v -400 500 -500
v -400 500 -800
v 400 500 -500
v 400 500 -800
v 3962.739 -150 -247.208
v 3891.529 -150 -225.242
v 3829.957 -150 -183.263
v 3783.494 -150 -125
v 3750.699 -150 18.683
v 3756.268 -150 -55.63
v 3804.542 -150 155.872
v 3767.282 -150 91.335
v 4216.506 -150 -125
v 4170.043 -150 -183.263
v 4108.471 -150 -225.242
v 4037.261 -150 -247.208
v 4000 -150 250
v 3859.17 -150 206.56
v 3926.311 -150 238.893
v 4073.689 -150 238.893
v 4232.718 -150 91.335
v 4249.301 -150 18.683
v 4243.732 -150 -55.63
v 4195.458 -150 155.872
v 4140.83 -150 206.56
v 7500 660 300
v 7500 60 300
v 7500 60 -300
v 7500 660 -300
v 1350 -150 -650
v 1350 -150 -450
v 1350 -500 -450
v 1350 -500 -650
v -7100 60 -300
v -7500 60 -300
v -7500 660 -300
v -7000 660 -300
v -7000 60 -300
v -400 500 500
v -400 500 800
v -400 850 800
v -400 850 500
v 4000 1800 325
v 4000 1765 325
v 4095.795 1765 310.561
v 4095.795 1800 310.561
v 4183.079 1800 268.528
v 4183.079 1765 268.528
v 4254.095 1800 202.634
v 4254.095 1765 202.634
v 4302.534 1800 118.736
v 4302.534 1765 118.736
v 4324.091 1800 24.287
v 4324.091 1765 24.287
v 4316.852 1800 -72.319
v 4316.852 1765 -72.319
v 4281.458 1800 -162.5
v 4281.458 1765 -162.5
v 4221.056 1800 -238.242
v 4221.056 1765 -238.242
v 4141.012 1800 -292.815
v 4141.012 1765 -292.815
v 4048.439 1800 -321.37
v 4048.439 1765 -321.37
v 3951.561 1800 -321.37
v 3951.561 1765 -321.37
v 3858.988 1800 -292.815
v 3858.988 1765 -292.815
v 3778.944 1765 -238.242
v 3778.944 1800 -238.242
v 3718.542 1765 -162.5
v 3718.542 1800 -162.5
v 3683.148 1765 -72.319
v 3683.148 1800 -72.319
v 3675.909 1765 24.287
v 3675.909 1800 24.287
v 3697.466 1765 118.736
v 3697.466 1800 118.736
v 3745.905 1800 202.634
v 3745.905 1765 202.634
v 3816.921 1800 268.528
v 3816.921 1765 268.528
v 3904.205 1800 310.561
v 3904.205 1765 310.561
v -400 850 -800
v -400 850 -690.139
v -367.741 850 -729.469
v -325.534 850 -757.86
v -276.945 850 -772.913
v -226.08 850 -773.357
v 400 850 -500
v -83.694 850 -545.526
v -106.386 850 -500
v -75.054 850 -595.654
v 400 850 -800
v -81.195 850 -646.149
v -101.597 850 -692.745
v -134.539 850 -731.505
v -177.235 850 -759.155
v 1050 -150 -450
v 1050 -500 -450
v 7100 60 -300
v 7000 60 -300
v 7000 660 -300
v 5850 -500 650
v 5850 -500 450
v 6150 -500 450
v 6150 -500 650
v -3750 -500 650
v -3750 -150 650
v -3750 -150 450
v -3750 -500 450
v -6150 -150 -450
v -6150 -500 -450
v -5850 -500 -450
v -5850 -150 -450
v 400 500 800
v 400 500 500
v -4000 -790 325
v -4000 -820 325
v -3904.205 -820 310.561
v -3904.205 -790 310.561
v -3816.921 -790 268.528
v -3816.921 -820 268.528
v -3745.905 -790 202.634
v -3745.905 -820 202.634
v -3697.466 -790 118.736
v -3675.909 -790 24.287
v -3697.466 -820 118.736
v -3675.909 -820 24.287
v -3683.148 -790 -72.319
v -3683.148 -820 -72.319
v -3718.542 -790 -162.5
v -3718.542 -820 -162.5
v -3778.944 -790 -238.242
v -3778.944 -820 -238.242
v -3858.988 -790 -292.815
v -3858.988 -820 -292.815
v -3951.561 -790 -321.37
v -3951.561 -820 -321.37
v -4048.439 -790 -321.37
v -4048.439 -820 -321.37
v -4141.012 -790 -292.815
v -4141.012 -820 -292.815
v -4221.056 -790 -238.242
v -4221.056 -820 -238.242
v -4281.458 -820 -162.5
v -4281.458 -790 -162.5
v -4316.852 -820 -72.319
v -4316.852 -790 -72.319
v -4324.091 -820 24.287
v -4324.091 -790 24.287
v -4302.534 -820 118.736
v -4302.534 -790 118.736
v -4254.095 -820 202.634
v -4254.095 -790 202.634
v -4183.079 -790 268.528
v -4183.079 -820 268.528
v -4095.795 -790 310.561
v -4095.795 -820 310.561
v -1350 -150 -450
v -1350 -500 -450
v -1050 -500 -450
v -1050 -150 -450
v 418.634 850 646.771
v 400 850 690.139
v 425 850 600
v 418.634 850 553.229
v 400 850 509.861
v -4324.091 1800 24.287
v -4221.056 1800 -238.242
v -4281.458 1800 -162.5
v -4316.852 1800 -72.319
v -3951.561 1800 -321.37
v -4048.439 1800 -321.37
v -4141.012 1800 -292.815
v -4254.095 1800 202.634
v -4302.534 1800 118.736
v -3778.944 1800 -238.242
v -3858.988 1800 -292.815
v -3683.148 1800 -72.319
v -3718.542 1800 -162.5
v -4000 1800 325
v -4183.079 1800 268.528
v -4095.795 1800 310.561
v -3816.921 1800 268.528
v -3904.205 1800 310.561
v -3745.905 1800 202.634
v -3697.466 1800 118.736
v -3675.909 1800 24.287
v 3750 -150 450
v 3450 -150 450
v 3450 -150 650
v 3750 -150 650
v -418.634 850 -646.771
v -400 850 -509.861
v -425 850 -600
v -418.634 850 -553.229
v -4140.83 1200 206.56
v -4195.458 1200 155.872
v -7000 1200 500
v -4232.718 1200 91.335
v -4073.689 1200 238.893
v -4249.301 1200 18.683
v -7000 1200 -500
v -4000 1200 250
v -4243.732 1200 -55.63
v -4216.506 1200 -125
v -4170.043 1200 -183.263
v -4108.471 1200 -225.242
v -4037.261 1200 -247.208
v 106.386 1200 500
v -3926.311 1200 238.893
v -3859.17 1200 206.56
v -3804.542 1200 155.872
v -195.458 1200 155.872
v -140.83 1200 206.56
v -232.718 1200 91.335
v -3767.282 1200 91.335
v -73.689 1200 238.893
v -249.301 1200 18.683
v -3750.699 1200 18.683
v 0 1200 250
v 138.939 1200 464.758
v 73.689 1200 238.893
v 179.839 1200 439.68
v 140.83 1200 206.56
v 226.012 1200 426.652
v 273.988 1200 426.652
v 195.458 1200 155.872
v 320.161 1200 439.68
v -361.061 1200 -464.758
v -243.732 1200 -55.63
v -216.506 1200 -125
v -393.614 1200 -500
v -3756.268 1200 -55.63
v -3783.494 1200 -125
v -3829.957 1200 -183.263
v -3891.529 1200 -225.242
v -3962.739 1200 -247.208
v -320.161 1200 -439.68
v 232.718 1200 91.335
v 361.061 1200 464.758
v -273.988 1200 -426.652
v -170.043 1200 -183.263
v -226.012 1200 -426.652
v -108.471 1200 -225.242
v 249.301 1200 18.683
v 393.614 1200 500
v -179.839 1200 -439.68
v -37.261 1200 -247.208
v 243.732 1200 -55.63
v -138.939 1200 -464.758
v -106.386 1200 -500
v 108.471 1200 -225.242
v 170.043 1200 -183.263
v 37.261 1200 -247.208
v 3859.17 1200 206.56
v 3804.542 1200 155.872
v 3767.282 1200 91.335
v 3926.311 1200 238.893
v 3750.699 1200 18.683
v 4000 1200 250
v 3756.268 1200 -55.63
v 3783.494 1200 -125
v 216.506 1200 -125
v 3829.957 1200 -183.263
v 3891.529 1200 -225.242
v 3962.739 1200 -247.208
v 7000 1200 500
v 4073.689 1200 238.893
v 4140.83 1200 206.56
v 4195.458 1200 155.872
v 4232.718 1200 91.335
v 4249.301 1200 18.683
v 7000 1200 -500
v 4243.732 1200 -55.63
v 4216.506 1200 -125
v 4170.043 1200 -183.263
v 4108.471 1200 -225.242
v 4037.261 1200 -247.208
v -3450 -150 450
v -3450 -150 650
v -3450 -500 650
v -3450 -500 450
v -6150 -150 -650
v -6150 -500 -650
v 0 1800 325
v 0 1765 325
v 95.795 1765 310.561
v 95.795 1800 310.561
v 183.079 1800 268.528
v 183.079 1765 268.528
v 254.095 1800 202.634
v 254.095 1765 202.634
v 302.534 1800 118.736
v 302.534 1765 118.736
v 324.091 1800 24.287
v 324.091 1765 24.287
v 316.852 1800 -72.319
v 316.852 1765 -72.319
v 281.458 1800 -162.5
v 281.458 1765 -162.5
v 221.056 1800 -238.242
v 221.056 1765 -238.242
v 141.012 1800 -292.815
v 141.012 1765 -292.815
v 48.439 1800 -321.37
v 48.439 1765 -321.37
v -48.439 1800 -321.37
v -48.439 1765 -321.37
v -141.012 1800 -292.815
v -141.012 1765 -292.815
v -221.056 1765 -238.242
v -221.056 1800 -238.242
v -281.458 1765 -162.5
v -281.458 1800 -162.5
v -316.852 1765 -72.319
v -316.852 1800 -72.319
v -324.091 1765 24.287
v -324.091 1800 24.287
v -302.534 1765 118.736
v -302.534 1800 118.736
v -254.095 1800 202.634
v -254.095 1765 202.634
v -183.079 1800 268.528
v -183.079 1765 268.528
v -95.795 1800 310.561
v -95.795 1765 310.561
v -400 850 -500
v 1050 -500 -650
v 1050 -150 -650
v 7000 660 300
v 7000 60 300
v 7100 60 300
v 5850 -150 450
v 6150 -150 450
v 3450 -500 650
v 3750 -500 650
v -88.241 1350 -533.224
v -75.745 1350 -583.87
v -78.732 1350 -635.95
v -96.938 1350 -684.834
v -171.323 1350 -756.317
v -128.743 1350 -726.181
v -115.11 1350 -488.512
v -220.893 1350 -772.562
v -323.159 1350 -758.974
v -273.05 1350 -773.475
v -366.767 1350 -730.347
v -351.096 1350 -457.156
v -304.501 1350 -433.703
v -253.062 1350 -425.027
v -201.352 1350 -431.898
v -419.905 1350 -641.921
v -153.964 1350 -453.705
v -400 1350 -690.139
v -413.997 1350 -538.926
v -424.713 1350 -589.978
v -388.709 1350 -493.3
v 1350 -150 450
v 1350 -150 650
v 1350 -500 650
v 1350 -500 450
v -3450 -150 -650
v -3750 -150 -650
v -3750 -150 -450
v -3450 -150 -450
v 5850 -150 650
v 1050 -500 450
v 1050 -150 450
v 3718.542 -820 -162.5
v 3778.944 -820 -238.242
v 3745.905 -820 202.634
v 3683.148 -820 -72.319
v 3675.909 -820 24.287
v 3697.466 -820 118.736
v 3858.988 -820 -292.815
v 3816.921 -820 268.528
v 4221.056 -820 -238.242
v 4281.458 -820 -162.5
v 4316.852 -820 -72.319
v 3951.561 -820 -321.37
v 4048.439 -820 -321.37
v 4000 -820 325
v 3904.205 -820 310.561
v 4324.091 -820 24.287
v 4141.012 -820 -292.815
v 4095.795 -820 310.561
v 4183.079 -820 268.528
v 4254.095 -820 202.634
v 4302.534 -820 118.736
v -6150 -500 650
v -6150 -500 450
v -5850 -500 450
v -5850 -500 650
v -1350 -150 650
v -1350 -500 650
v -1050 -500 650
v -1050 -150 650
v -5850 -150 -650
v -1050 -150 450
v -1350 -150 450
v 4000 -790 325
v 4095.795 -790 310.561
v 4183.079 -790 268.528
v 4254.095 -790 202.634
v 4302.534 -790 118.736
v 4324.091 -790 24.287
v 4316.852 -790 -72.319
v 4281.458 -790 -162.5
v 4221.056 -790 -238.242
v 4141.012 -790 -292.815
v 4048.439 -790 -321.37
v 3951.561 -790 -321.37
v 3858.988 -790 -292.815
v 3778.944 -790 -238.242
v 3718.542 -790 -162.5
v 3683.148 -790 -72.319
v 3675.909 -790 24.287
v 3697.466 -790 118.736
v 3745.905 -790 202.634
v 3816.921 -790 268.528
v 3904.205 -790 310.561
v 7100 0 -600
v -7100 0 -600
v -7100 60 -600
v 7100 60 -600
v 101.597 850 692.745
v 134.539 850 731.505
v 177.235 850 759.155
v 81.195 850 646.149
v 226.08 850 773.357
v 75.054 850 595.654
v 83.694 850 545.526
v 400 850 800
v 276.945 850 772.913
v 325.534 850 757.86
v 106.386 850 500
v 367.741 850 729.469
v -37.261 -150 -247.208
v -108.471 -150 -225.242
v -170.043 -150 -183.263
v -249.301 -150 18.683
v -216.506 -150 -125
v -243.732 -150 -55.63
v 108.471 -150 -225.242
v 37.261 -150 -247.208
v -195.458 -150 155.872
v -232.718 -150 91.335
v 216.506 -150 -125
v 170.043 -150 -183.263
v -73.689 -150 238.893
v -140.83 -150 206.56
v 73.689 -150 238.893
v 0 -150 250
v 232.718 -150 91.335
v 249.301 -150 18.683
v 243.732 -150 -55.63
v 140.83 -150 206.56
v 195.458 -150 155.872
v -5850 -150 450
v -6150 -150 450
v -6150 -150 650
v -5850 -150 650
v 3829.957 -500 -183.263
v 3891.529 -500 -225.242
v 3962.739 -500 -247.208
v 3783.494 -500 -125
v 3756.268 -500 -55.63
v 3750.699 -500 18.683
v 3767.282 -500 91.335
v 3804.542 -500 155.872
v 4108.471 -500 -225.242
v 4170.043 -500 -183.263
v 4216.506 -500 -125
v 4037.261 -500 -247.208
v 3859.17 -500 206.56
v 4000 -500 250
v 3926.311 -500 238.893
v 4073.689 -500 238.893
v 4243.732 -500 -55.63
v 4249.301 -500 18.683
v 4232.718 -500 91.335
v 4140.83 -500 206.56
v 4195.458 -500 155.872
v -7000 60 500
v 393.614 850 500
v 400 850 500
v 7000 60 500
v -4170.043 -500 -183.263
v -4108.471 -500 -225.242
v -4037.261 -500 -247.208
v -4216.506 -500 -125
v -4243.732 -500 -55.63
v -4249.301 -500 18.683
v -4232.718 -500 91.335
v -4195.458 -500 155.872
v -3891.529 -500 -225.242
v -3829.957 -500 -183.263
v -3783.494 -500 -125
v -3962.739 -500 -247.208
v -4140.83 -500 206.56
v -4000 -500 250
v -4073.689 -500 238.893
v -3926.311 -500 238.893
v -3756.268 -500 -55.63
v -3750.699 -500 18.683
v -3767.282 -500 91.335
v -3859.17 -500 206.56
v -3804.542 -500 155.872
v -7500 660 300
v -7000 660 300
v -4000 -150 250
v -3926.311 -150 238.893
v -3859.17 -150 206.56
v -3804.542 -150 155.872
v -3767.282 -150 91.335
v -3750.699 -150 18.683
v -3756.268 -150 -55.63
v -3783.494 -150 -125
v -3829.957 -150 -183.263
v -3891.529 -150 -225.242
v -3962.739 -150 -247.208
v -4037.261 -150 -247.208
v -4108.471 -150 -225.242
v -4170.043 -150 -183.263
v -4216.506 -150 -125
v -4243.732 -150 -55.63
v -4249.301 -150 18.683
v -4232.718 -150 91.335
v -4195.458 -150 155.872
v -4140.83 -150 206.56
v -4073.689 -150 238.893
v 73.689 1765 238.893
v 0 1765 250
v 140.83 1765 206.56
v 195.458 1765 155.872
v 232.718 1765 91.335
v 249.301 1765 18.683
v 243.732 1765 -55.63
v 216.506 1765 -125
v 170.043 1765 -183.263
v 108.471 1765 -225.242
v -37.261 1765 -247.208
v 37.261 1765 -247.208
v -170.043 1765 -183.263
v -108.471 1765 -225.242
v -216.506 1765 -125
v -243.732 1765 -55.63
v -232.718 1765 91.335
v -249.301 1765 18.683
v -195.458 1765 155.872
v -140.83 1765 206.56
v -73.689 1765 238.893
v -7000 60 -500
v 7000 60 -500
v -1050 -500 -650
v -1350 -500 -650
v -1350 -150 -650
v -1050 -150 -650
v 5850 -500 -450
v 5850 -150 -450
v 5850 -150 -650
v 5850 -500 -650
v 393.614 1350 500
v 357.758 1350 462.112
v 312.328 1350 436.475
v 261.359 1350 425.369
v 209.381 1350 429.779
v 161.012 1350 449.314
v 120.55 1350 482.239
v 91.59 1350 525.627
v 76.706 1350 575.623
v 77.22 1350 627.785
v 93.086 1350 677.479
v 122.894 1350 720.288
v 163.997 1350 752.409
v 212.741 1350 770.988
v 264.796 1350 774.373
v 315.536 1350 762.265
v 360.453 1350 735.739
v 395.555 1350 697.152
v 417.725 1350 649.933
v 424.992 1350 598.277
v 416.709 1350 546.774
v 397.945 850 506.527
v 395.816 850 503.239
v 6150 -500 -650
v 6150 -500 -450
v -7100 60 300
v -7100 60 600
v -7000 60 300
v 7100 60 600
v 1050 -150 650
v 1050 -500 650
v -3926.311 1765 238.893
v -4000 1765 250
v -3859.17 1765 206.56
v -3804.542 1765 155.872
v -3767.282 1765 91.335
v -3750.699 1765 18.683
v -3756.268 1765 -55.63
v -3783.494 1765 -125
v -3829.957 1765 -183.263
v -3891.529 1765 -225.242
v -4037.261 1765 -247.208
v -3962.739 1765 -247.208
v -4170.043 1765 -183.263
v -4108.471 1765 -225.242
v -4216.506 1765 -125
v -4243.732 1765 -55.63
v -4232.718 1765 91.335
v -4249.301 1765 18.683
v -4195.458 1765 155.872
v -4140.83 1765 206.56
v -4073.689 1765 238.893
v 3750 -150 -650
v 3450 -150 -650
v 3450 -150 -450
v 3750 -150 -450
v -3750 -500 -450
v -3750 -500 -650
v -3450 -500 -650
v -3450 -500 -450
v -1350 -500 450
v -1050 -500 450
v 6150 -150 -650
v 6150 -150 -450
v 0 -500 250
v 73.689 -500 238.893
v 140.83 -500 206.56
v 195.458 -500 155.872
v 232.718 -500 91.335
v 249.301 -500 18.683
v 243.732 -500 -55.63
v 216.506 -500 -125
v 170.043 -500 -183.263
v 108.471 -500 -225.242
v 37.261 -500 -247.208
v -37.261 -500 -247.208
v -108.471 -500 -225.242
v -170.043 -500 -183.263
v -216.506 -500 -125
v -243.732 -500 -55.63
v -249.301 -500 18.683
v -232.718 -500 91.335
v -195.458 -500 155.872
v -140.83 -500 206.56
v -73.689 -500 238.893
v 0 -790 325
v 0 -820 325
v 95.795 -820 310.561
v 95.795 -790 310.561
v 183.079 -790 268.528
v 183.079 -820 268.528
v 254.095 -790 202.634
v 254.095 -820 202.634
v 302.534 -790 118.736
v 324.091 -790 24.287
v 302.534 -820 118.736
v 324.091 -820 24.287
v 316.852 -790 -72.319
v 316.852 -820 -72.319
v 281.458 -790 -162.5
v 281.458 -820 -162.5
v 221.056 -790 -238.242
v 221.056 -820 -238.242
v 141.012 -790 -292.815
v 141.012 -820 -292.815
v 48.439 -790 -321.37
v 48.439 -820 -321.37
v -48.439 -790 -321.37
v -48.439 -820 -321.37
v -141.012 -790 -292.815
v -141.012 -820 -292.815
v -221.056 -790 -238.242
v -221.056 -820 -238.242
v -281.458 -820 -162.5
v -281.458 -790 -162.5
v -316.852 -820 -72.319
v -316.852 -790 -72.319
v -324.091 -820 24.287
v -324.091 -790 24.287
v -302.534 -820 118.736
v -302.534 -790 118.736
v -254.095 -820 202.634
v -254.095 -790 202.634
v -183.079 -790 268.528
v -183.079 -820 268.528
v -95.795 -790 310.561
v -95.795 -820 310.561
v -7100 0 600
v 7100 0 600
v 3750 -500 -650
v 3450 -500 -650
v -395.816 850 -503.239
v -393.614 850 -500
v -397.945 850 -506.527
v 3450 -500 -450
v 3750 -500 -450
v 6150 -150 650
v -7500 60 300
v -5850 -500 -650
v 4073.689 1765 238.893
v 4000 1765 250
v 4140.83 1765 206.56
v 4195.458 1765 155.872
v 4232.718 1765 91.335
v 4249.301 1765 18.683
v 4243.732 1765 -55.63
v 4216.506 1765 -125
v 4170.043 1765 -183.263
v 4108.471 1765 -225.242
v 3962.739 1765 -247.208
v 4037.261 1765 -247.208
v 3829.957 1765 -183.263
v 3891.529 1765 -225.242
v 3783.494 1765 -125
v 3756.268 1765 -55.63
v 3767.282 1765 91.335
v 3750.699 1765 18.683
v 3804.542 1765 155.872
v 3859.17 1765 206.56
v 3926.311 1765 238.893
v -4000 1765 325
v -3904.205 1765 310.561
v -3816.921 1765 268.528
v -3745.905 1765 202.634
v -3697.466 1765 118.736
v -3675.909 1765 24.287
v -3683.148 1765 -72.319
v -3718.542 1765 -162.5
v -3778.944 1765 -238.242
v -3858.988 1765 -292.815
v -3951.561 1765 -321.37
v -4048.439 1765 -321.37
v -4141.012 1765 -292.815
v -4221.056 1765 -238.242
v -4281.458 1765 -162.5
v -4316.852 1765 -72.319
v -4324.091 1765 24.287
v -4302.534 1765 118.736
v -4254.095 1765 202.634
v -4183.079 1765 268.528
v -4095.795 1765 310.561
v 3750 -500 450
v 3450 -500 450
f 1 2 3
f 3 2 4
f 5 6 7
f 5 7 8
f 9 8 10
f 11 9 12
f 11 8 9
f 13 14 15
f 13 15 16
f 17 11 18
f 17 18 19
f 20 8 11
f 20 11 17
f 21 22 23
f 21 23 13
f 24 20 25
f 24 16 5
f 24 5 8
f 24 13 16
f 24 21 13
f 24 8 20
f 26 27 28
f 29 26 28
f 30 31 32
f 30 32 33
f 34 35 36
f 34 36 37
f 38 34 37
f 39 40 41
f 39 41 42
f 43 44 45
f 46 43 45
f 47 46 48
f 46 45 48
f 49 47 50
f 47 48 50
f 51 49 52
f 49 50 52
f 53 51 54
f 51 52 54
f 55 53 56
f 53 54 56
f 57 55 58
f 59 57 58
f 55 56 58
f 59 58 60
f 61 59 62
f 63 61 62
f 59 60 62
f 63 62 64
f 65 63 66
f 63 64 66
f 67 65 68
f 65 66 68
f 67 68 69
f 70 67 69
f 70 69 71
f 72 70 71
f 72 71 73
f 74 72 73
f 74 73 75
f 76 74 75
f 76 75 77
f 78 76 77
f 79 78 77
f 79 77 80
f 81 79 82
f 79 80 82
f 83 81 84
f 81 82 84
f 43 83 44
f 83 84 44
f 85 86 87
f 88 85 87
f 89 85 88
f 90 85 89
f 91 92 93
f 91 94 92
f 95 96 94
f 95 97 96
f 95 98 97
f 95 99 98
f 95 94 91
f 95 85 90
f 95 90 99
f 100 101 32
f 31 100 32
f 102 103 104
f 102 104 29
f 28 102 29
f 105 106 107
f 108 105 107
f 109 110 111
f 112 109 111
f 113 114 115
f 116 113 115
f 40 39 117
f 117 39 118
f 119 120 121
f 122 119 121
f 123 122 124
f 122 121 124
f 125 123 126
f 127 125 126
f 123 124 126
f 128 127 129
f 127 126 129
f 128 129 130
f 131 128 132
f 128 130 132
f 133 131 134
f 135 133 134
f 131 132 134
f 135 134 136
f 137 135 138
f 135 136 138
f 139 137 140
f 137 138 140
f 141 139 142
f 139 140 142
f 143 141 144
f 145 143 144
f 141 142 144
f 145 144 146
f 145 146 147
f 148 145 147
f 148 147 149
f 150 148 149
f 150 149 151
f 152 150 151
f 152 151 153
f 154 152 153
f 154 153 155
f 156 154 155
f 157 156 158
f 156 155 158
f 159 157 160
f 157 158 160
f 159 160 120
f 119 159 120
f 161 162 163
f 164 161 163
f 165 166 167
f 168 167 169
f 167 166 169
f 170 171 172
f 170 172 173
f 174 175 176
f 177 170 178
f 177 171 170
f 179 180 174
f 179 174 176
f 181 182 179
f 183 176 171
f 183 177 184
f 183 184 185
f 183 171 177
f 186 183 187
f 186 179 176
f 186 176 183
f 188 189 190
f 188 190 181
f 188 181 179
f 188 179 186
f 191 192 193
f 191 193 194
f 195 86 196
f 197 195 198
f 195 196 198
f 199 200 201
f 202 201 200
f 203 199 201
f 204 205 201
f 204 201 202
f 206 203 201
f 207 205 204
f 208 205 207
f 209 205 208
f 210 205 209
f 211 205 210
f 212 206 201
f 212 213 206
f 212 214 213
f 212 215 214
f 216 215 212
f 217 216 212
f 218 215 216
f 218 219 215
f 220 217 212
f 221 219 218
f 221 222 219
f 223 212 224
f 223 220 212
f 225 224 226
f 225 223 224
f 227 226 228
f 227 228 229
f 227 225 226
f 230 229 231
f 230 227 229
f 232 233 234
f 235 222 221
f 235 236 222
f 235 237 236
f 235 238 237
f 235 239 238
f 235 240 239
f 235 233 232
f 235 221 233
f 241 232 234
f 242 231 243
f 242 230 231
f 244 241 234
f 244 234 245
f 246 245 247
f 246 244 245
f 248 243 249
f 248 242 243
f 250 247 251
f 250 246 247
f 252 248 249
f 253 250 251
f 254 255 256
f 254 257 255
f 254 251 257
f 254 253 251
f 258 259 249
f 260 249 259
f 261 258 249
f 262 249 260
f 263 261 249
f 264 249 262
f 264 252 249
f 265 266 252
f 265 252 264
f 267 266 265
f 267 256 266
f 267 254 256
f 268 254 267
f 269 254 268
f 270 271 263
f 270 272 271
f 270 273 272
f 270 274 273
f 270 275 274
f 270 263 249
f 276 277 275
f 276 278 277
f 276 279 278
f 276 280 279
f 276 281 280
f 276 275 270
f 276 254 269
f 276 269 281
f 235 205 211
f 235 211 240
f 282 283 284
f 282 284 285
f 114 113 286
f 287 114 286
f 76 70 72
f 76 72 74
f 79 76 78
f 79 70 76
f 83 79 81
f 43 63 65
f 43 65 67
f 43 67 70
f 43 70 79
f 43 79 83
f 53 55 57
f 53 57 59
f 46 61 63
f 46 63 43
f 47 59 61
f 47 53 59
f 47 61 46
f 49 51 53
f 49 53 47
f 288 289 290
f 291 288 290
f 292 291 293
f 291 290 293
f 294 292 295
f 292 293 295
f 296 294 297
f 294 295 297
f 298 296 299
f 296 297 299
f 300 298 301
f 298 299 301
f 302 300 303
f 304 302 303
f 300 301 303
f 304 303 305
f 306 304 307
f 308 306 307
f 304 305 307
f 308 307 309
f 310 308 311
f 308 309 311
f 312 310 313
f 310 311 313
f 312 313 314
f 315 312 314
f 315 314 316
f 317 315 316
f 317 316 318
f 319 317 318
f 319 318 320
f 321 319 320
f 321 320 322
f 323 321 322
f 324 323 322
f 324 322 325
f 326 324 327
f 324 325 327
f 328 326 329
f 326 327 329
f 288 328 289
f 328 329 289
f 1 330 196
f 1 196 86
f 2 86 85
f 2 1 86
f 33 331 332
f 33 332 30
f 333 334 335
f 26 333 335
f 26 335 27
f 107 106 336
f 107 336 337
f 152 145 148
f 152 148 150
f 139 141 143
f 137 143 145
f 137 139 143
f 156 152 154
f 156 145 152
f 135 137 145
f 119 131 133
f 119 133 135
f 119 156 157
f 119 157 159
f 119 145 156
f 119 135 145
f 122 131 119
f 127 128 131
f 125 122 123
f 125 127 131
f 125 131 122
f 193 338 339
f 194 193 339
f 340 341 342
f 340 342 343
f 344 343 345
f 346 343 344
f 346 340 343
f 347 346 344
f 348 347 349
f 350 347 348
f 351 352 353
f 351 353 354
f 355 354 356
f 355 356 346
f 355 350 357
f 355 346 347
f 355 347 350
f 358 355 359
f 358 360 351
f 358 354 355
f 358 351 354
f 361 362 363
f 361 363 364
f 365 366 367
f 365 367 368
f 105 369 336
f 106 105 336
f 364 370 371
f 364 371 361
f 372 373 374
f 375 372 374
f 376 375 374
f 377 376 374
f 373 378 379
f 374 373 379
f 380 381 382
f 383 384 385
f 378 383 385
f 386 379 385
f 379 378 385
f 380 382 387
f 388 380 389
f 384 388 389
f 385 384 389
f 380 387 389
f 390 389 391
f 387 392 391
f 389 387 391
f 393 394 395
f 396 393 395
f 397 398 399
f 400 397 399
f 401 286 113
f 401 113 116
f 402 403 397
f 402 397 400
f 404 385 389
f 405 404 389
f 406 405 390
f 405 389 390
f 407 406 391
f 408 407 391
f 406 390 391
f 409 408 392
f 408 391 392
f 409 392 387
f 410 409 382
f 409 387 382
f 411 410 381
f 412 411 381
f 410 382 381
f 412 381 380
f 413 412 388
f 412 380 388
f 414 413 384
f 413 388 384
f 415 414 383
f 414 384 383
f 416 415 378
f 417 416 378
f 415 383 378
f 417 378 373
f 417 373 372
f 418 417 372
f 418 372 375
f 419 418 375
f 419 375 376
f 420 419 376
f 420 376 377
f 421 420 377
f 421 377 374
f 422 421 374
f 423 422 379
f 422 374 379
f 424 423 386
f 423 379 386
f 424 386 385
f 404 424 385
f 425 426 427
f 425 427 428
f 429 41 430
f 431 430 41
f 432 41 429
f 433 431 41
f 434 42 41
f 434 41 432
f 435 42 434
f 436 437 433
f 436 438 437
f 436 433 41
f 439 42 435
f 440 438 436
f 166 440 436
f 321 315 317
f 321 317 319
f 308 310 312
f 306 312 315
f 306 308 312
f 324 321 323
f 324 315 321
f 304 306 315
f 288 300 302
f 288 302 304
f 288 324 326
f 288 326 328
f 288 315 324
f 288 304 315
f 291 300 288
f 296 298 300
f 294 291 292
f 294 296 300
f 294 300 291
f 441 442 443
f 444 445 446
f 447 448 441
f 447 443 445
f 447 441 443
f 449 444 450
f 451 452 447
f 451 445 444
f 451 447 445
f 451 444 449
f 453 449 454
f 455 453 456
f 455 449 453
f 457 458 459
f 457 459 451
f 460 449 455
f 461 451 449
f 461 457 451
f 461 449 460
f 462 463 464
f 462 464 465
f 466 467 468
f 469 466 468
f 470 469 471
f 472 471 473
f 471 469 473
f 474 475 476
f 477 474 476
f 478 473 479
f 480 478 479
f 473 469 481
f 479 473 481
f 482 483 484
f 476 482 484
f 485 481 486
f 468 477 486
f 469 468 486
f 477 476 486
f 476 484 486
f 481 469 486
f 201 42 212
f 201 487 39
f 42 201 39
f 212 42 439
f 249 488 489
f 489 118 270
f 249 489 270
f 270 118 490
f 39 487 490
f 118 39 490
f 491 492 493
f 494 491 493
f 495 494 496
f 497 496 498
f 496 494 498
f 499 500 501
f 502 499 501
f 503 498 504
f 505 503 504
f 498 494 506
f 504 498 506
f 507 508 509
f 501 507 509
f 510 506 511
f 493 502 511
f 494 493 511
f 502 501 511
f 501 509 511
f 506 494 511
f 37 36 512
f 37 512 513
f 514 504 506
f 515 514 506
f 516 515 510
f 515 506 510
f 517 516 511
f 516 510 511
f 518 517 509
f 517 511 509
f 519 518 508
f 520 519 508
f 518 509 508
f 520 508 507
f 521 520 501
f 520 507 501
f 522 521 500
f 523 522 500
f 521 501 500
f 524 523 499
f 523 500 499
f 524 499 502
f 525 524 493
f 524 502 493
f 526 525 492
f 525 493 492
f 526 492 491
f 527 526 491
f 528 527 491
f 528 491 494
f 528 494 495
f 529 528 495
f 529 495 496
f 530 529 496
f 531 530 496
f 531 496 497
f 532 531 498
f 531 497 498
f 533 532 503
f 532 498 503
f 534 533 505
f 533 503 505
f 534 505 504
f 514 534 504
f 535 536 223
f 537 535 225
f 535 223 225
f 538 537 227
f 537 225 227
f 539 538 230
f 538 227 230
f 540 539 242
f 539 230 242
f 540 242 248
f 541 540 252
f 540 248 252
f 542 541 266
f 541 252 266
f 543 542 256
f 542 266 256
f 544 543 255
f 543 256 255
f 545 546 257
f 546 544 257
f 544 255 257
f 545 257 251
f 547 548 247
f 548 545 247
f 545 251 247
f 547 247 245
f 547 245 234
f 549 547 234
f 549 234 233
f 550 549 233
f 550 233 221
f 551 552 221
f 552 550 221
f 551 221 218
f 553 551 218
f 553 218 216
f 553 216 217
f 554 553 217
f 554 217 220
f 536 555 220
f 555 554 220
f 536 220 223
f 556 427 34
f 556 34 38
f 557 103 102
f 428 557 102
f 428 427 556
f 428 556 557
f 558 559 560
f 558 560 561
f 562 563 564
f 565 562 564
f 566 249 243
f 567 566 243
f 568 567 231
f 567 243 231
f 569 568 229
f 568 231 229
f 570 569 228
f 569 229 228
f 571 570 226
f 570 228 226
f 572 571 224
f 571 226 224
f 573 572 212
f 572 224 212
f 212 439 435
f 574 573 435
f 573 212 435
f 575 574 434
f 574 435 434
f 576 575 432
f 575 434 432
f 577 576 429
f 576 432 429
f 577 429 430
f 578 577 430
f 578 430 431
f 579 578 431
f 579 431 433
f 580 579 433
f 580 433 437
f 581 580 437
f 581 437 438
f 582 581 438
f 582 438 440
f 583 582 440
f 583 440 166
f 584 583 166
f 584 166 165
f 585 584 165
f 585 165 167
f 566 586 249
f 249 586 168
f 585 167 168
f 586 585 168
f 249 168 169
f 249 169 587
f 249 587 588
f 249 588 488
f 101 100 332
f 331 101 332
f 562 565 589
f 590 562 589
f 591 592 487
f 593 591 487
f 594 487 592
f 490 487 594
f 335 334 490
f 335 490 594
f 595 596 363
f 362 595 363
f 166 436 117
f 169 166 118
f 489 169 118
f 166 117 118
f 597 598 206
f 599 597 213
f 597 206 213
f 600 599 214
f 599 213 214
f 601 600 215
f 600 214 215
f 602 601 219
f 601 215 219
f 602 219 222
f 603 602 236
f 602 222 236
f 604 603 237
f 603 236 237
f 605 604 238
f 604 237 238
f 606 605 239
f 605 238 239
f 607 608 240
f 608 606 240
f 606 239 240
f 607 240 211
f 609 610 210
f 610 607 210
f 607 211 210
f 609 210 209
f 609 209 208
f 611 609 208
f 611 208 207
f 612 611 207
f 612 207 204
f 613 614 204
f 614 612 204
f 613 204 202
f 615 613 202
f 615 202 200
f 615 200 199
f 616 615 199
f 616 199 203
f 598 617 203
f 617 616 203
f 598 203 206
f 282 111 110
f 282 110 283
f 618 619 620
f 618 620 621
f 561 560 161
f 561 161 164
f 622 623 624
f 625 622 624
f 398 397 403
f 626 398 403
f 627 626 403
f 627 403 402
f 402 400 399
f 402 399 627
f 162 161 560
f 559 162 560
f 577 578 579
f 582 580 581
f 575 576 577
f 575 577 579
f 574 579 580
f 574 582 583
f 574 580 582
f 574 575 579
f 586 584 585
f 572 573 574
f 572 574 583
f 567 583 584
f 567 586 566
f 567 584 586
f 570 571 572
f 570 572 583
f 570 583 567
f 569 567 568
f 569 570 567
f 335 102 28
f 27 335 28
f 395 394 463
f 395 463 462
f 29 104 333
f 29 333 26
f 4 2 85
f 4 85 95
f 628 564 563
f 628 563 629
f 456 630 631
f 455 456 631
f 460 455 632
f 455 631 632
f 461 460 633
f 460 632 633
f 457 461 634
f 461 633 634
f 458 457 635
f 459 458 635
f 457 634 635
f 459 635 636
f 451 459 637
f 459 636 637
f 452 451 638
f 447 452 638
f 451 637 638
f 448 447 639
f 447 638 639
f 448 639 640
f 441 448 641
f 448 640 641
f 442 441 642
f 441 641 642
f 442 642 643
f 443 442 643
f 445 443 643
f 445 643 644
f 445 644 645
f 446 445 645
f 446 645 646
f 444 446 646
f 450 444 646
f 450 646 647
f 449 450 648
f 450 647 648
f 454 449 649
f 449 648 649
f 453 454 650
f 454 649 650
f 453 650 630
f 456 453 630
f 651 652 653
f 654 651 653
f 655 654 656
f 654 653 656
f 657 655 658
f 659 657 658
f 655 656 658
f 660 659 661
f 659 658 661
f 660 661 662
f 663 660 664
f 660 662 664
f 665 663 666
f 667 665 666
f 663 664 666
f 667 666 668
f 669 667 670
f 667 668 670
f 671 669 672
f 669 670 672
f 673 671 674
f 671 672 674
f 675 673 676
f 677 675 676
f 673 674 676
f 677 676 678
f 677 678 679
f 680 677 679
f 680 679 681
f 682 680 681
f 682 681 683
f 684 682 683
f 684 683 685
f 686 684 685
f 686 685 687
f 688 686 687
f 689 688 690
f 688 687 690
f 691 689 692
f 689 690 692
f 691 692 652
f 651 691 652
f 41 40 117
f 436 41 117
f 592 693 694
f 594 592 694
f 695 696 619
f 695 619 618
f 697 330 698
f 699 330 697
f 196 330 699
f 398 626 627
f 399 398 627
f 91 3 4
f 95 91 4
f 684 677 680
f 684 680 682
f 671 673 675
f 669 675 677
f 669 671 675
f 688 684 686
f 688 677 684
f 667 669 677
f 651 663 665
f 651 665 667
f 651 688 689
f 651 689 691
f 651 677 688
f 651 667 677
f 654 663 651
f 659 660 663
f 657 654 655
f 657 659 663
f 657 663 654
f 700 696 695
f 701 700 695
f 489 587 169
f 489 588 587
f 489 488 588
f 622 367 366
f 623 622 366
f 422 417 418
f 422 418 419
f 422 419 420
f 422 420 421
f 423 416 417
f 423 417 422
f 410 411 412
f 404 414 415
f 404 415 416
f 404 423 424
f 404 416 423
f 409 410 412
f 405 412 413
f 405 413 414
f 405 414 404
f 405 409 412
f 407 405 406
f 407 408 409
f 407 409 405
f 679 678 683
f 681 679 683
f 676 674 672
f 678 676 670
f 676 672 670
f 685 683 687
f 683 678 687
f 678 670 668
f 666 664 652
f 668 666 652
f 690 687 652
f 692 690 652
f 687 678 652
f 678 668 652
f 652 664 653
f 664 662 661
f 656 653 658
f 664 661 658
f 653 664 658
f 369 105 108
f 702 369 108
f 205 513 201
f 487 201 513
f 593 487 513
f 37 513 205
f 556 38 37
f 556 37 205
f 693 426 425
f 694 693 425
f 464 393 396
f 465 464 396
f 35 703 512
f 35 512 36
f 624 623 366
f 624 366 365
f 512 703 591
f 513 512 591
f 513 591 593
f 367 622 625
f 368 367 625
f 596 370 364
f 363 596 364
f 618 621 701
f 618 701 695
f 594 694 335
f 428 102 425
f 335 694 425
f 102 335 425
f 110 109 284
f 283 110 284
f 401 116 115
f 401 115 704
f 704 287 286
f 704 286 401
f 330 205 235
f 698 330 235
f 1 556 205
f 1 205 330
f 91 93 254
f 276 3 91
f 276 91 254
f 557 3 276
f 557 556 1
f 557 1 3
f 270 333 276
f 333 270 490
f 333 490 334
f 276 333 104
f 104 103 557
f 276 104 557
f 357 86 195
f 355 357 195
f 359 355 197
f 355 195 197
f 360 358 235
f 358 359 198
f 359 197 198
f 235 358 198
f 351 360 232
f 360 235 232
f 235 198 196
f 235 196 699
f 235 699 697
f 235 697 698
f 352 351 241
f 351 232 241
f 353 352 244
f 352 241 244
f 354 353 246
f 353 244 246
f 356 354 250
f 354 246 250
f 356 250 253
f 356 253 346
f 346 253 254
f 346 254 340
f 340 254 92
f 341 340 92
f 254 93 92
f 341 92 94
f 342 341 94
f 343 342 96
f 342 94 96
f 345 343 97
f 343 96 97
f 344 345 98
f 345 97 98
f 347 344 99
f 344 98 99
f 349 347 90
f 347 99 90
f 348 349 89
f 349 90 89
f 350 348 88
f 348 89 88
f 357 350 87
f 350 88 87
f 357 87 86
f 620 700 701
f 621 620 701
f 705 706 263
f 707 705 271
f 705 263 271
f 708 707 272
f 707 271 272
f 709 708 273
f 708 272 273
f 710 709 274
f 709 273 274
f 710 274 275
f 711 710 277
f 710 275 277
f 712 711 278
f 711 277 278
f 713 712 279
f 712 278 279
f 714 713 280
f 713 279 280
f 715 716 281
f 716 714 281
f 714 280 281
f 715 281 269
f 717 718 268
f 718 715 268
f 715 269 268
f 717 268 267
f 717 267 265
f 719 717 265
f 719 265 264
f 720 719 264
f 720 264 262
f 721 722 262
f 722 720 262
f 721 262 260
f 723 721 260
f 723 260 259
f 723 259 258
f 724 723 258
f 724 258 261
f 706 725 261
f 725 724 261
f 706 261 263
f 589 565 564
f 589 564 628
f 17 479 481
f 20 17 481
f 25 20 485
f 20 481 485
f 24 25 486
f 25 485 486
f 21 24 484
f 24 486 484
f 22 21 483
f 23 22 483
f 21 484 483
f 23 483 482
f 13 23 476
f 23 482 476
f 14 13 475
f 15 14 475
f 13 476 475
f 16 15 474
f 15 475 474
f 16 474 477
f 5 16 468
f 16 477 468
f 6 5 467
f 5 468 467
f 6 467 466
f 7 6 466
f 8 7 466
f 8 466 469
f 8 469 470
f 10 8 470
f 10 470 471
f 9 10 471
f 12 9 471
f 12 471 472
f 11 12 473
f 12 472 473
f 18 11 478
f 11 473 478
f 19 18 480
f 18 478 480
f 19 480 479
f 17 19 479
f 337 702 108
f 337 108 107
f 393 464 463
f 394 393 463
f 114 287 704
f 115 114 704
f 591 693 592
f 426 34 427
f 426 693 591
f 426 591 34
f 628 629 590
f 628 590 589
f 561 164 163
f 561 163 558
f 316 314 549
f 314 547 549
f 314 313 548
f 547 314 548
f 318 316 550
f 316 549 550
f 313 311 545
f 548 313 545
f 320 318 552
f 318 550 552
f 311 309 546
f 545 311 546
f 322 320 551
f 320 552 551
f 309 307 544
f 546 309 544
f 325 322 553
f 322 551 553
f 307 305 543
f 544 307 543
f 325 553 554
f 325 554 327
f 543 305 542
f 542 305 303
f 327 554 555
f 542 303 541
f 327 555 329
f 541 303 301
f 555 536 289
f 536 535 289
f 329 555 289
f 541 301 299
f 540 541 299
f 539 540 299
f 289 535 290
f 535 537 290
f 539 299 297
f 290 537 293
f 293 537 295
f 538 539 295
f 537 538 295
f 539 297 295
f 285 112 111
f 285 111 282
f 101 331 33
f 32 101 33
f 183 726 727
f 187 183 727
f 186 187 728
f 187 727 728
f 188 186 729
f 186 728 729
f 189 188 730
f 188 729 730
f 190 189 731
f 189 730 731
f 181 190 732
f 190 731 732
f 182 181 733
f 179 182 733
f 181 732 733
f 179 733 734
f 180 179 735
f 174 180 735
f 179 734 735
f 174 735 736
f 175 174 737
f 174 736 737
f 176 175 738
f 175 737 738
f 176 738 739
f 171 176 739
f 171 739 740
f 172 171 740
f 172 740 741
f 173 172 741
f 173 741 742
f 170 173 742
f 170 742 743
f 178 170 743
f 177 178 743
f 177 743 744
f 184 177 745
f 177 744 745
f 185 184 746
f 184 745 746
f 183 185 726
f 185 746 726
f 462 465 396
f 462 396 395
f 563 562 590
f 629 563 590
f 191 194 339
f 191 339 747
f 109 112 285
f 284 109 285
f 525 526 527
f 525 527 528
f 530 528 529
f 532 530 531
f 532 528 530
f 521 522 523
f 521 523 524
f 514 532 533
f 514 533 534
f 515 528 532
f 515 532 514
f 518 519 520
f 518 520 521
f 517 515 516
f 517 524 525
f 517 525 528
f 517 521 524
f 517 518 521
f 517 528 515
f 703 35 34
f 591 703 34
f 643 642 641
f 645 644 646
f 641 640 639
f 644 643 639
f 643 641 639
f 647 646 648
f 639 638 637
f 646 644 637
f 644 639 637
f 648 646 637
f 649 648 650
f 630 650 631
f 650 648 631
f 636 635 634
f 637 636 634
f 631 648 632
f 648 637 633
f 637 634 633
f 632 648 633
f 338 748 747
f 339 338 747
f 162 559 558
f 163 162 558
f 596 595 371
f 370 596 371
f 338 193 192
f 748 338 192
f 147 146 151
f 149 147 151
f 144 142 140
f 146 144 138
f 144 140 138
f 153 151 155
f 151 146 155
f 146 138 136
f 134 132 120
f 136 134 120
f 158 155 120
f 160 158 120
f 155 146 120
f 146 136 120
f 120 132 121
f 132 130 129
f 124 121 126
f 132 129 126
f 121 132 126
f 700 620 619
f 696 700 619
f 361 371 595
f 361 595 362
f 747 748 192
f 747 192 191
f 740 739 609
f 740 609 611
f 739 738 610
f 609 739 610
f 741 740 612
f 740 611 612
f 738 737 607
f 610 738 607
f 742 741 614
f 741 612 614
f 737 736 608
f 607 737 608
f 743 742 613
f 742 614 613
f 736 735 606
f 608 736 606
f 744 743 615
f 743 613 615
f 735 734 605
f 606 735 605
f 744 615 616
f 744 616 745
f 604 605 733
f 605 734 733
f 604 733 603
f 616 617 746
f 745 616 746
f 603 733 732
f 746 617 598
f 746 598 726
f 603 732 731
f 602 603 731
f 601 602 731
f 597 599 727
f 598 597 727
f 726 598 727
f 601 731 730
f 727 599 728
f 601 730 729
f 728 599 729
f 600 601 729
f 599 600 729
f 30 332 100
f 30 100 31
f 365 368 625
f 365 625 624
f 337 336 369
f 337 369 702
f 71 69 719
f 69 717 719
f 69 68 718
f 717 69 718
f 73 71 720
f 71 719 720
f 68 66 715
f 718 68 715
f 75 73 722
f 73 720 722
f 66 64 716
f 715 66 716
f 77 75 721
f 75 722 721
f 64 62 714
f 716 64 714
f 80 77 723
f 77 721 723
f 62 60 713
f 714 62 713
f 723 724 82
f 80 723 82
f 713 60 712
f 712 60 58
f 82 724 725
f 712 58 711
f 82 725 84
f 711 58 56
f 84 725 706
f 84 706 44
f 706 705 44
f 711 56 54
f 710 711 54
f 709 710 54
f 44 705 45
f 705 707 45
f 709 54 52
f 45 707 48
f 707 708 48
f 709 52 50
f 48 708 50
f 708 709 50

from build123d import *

# Parameters (mm, degrees)
SKETCH1_W               = 14000
SKETCH1_H               = 1000
BOSS_EXTRUDE1_DEPTH     = 500
BOSS_EXTRUDE2_START     = -500
SKETCH2_R               = 250
BOSS_EXTRUDE2_DEPTH     = 350
BOSS_EXTRUDE2_2_DEPTH   = 350
BOSS_EXTRUDE2_3_DEPTH   = 350
BOSS_EXTRUDE3_START     = -820
SKETCH3_R               = 325
BOSS_EXTRUDE3_DEPTH     = 30
BOSS_EXTRUDE3_2_DEPTH   = 30
BOSS_EXTRUDE3_3_DEPTH   = 30
SKETCH4_W               = 14200
SKETCH4_H               = 1200
BOSS_EXTRUDE4_DEPTH     = 60
BOSS_EXTRUDE5_START     = 60
SKETCH5_W               = 14000
SKETCH5_H               = 1000
BOSS_EXTRUDE5_DEPTH     = 1140
BOSS_EXTRUDE6_START     = 1200
SKETCH6_R               = 250
BOSS_EXTRUDE6_DEPTH     = 600
BOSS_EXTRUDE7_START     = 1765
SKETCH7_R               = 325
BOSS_EXTRUDE7_DEPTH     = 35
BOSS_EXTRUDE8_START     = 60
SKETCH8_W               = 500
SKETCH8_H               = 600
BOSS_EXTRUDE8_DEPTH     = 600
BOSS_EXTRUDE9_START     = 500
SKETCH9_W               = 800
SKETCH9_H               = 1600
BOSS_EXTRUDE9_DEPTH     = 350
BOSS_EXTRUDE10_START    = 850
SKETCH10_R              = 175
BOSS_EXTRUDE10_DEPTH    = 500
BOSS_EXTRUDE11_START    = -500
SKETCH11_W              = 300
SKETCH11_H              = 200
BOSS_EXTRUDE11_DEPTH    = 350
BOSS_EXTRUDE11_2_DEPTH  = 350
BOSS_EXTRUDE11_3_DEPTH  = 350
BOSS_EXTRUDE11_4_DEPTH  = 350
BOSS_EXTRUDE11_5_DEPTH  = 350
BOSS_EXTRUDE11_6_DEPTH  = 350
BOSS_EXTRUDE11_7_DEPTH  = 350
BOSS_EXTRUDE11_8_DEPTH  = 350
BOSS_EXTRUDE11_9_DEPTH  = 350
BOSS_EXTRUDE11_10_DEPTH = 350
BOSS_EXTRUDE11_11_DEPTH = 350
BOSS_EXTRUDE11_12_DEPTH = 350


with BuildPart() as part:
    # Sketch1 → Boss-Extrude1 (new body)
    with BuildSketch(Plane(origin=(0, 0, 0), x_dir=(1, 0, 0), z_dir=(0, 1, 0))):
        Rectangle(SKETCH1_W, SKETCH1_H)
    extrude(amount=BOSS_EXTRUDE1_DEPTH)

    # Sketch4 → Boss-Extrude4 (add)
    with BuildSketch(Plane(origin=(0, 0, 0), x_dir=(1, 0, 0), z_dir=(0, 1, 0))):
        Rectangle(SKETCH4_W, SKETCH4_H)
    extrude(amount=BOSS_EXTRUDE4_DEPTH)

    # Sketch5 → Boss-Extrude5 (add)
    with BuildSketch(Plane(origin=(0, 0, 0), x_dir=(1, 0, 0), z_dir=(0, 1, 0)).offset(BOSS_EXTRUDE5_START)):
        Rectangle(SKETCH5_W, SKETCH5_H)
    extrude(amount=BOSS_EXTRUDE5_DEPTH)

    # Sketch6 → Boss-Extrude6 (add)
    with BuildSketch(Plane(origin=(0, 0, 0), x_dir=(1, 0, 0), z_dir=(0, 1, 0)).offset(BOSS_EXTRUDE6_START)):
        with Locations(Location((-4000, 0, 0), (0, 0, 270))):
            Circle(SKETCH6_R)
        with Locations(Location((0, 0, 0), (0, 0, 270))):
            Circle(SKETCH6_R)
        with Locations(Location((4000, 0, 0), (0, 0, 270))):
            Circle(SKETCH6_R)
    extrude(amount=BOSS_EXTRUDE6_DEPTH)

    # Sketch7 → Boss-Extrude7 (add)
    with BuildSketch(Plane(origin=(0, 0, 0), x_dir=(1, 0, 0), z_dir=(0, 1, 0)).offset(BOSS_EXTRUDE7_START)):
        with Locations(Location((-4000, 0, 0), (0, 0, 270))):
            Circle(SKETCH7_R)
        with Locations(Location((0, 0, 0), (0, 0, 270))):
            Circle(SKETCH7_R)
        with Locations(Location((4000, 0, 0), (0, 0, 270))):
            Circle(SKETCH7_R)
    extrude(amount=BOSS_EXTRUDE7_DEPTH)

    # Sketch8 → Boss-Extrude8 (add)
    with BuildSketch(Plane(origin=(0, 0, 0), x_dir=(1, 0, 0), z_dir=(0, 1, 0)).offset(BOSS_EXTRUDE8_START)):
        with Locations((-7250, 0)):
            Rectangle(SKETCH8_W, SKETCH8_H)
        with Locations((7250, 0)):
            Rectangle(SKETCH8_W, SKETCH8_H)
    extrude(amount=BOSS_EXTRUDE8_DEPTH)

    # Sketch9 → Boss-Extrude9 (add)
    with BuildSketch(Plane(origin=(0, 0, 0), x_dir=(1, 0, 0), z_dir=(0, 1, 0)).offset(BOSS_EXTRUDE9_START)):
        Rectangle(SKETCH9_W, SKETCH9_H)
    extrude(amount=BOSS_EXTRUDE9_DEPTH)

    # Sketch10 → Boss-Extrude10 (add)
    with BuildSketch(Plane(origin=(0, 0, 0), x_dir=(1, 0, 0), z_dir=(0, 1, 0)).offset(BOSS_EXTRUDE10_START)):
        with Locations(Location((-250, 600, 0), (0, 0, 148.997280866))):
            Circle(SKETCH10_R)
        with Locations(Location((250, -600, 0), (0, 0, 34.849904579))):
            Circle(SKETCH10_R)
    extrude(amount=BOSS_EXTRUDE10_DEPTH)


with BuildPart() as body_2:
    # Sketch2 → Boss-Extrude2 (new body)
    with BuildSketch(Plane(origin=(0, 0, 0), x_dir=(1, 0, 0), z_dir=(0, 1, 0)).offset(BOSS_EXTRUDE2_START)):
        with Locations(Location((-4000, 0, 0), (0, 0, 270))):
            Circle(SKETCH2_R)
    extrude(amount=BOSS_EXTRUDE2_DEPTH)


with BuildPart() as body_3:
    # Sketch2 → Boss-Extrude2 2 (new body)
    with BuildSketch(Plane(origin=(0, 0, 0), x_dir=(1, 0, 0), z_dir=(0, 1, 0)).offset(BOSS_EXTRUDE2_START)):
        with Locations(Location((0, 0, 0), (0, 0, 270))):
            Circle(SKETCH2_R)
    extrude(amount=BOSS_EXTRUDE2_2_DEPTH)


with BuildPart() as body_4:
    # Sketch2 → Boss-Extrude2 3 (new body)
    with BuildSketch(Plane(origin=(0, 0, 0), x_dir=(1, 0, 0), z_dir=(0, 1, 0)).offset(BOSS_EXTRUDE2_START)):
        with Locations(Location((4000, 0, 0), (0, 0, 270))):
            Circle(SKETCH2_R)
    extrude(amount=BOSS_EXTRUDE2_3_DEPTH)


with BuildPart() as body_5:
    # Sketch3 → Boss-Extrude3 (new body)
    with BuildSketch(Plane(origin=(0, 0, 0), x_dir=(1, 0, 0), z_dir=(0, 1, 0)).offset(BOSS_EXTRUDE3_START)):
        with Locations(Location((-4000, 0, 0), (0, 0, 270))):
            Circle(SKETCH3_R)
    extrude(amount=BOSS_EXTRUDE3_DEPTH)


with BuildPart() as body_6:
    # Sketch3 → Boss-Extrude3 2 (new body)
    with BuildSketch(Plane(origin=(0, 0, 0), x_dir=(1, 0, 0), z_dir=(0, 1, 0)).offset(BOSS_EXTRUDE3_START)):
        with Locations(Location((0, 0, 0), (0, 0, 270))):
            Circle(SKETCH3_R)
    extrude(amount=BOSS_EXTRUDE3_2_DEPTH)


with BuildPart() as body_7:
    # Sketch3 → Boss-Extrude3 3 (new body)
    with BuildSketch(Plane(origin=(0, 0, 0), x_dir=(1, 0, 0), z_dir=(0, 1, 0)).offset(BOSS_EXTRUDE3_START)):
        with Locations(Location((4000, 0, 0), (0, 0, 270))):
            Circle(SKETCH3_R)
    extrude(amount=BOSS_EXTRUDE3_3_DEPTH)


with BuildPart() as body_8:
    # Sketch11 → Boss-Extrude11 (new body)
    with BuildSketch(Plane(origin=(0, 0, 0), x_dir=(1, 0, 0), z_dir=(0, 1, 0)).offset(BOSS_EXTRUDE11_START)):
        with Locations((-6000, -550)):
            Rectangle(SKETCH11_W, SKETCH11_H)
    extrude(amount=BOSS_EXTRUDE11_DEPTH)


with BuildPart() as body_9:
    # Sketch11 → Boss-Extrude11 2 (new body)
    with BuildSketch(Plane(origin=(0, 0, 0), x_dir=(1, 0, 0), z_dir=(0, 1, 0)).offset(BOSS_EXTRUDE11_START)):
        with Locations((-6000, 550)):
            Rectangle(SKETCH11_W, SKETCH11_H)
    extrude(amount=BOSS_EXTRUDE11_2_DEPTH)


with BuildPart() as body_10:
    # Sketch11 → Boss-Extrude11 3 (new body)
    with BuildSketch(Plane(origin=(0, 0, 0), x_dir=(1, 0, 0), z_dir=(0, 1, 0)).offset(BOSS_EXTRUDE11_START)):
        with Locations((-3600, -550)):
            Rectangle(SKETCH11_W, SKETCH11_H)
    extrude(amount=BOSS_EXTRUDE11_3_DEPTH)


with BuildPart() as body_11:
    # Sketch11 → Boss-Extrude11 4 (new body)
    with BuildSketch(Plane(origin=(0, 0, 0), x_dir=(1, 0, 0), z_dir=(0, 1, 0)).offset(BOSS_EXTRUDE11_START)):
        with Locations((-3600, 550)):
            Rectangle(SKETCH11_W, SKETCH11_H)
    extrude(amount=BOSS_EXTRUDE11_4_DEPTH)


with BuildPart() as body_12:
    # Sketch11 → Boss-Extrude11 5 (new body)
    with BuildSketch(Plane(origin=(0, 0, 0), x_dir=(1, 0, 0), z_dir=(0, 1, 0)).offset(BOSS_EXTRUDE11_START)):
        with Locations((-1200, -550)):
            Rectangle(SKETCH11_W, SKETCH11_H)
    extrude(amount=BOSS_EXTRUDE11_5_DEPTH)


with BuildPart() as body_13:
    # Sketch11 → Boss-Extrude11 6 (new body)
    with BuildSketch(Plane(origin=(0, 0, 0), x_dir=(1, 0, 0), z_dir=(0, 1, 0)).offset(BOSS_EXTRUDE11_START)):
        with Locations((-1200, 550)):
            Rectangle(SKETCH11_W, SKETCH11_H)
    extrude(amount=BOSS_EXTRUDE11_6_DEPTH)


with BuildPart() as body_14:
    # Sketch11 → Boss-Extrude11 7 (new body)
    with BuildSketch(Plane(origin=(0, 0, 0), x_dir=(1, 0, 0), z_dir=(0, 1, 0)).offset(BOSS_EXTRUDE11_START)):
        with Locations((1200, -550)):
            Rectangle(SKETCH11_W, SKETCH11_H)
    extrude(amount=BOSS_EXTRUDE11_7_DEPTH)


with BuildPart() as body_15:
    # Sketch11 → Boss-Extrude11 8 (new body)
    with BuildSketch(Plane(origin=(0, 0, 0), x_dir=(1, 0, 0), z_dir=(0, 1, 0)).offset(BOSS_EXTRUDE11_START)):
        with Locations((1200, 550)):
            Rectangle(SKETCH11_W, SKETCH11_H)
    extrude(amount=BOSS_EXTRUDE11_8_DEPTH)


with BuildPart() as body_16:
    # Sketch11 → Boss-Extrude11 9 (new body)
    with BuildSketch(Plane(origin=(0, 0, 0), x_dir=(1, 0, 0), z_dir=(0, 1, 0)).offset(BOSS_EXTRUDE11_START)):
        with Locations((3600, -550)):
            Rectangle(SKETCH11_W, SKETCH11_H)
    extrude(amount=BOSS_EXTRUDE11_9_DEPTH)


with BuildPart() as body_17:
    # Sketch11 → Boss-Extrude11 10 (new body)
    with BuildSketch(Plane(origin=(0, 0, 0), x_dir=(1, 0, 0), z_dir=(0, 1, 0)).offset(BOSS_EXTRUDE11_START)):
        with Locations((3600, 550)):
            Rectangle(SKETCH11_W, SKETCH11_H)
    extrude(amount=BOSS_EXTRUDE11_10_DEPTH)


with BuildPart() as body_18:
    # Sketch11 → Boss-Extrude11 11 (new body)
    with BuildSketch(Plane(origin=(0, 0, 0), x_dir=(1, 0, 0), z_dir=(0, 1, 0)).offset(BOSS_EXTRUDE11_START)):
        with Locations((6000, -550)):
            Rectangle(SKETCH11_W, SKETCH11_H)
    extrude(amount=BOSS_EXTRUDE11_11_DEPTH)


with BuildPart() as body_19:
    # Sketch11 → Boss-Extrude11 12 (new body)
    with BuildSketch(Plane(origin=(0, 0, 0), x_dir=(1, 0, 0), z_dir=(0, 1, 0)).offset(BOSS_EXTRUDE11_START)):
        with Locations((6000, 550)):
            Rectangle(SKETCH11_W, SKETCH11_H)
    extrude(amount=BOSS_EXTRUDE11_12_DEPTH)


solid = Compound([part.part, body_2.part, body_3.part, body_4.part, body_5.part, body_6.part, body_7.part, body_8.part, body_9.part, body_10.part, body_11.part, body_12.part, body_13.part, body_14.part, body_15.part, body_16.part, body_17.part, body_18.part, body_19.part])
